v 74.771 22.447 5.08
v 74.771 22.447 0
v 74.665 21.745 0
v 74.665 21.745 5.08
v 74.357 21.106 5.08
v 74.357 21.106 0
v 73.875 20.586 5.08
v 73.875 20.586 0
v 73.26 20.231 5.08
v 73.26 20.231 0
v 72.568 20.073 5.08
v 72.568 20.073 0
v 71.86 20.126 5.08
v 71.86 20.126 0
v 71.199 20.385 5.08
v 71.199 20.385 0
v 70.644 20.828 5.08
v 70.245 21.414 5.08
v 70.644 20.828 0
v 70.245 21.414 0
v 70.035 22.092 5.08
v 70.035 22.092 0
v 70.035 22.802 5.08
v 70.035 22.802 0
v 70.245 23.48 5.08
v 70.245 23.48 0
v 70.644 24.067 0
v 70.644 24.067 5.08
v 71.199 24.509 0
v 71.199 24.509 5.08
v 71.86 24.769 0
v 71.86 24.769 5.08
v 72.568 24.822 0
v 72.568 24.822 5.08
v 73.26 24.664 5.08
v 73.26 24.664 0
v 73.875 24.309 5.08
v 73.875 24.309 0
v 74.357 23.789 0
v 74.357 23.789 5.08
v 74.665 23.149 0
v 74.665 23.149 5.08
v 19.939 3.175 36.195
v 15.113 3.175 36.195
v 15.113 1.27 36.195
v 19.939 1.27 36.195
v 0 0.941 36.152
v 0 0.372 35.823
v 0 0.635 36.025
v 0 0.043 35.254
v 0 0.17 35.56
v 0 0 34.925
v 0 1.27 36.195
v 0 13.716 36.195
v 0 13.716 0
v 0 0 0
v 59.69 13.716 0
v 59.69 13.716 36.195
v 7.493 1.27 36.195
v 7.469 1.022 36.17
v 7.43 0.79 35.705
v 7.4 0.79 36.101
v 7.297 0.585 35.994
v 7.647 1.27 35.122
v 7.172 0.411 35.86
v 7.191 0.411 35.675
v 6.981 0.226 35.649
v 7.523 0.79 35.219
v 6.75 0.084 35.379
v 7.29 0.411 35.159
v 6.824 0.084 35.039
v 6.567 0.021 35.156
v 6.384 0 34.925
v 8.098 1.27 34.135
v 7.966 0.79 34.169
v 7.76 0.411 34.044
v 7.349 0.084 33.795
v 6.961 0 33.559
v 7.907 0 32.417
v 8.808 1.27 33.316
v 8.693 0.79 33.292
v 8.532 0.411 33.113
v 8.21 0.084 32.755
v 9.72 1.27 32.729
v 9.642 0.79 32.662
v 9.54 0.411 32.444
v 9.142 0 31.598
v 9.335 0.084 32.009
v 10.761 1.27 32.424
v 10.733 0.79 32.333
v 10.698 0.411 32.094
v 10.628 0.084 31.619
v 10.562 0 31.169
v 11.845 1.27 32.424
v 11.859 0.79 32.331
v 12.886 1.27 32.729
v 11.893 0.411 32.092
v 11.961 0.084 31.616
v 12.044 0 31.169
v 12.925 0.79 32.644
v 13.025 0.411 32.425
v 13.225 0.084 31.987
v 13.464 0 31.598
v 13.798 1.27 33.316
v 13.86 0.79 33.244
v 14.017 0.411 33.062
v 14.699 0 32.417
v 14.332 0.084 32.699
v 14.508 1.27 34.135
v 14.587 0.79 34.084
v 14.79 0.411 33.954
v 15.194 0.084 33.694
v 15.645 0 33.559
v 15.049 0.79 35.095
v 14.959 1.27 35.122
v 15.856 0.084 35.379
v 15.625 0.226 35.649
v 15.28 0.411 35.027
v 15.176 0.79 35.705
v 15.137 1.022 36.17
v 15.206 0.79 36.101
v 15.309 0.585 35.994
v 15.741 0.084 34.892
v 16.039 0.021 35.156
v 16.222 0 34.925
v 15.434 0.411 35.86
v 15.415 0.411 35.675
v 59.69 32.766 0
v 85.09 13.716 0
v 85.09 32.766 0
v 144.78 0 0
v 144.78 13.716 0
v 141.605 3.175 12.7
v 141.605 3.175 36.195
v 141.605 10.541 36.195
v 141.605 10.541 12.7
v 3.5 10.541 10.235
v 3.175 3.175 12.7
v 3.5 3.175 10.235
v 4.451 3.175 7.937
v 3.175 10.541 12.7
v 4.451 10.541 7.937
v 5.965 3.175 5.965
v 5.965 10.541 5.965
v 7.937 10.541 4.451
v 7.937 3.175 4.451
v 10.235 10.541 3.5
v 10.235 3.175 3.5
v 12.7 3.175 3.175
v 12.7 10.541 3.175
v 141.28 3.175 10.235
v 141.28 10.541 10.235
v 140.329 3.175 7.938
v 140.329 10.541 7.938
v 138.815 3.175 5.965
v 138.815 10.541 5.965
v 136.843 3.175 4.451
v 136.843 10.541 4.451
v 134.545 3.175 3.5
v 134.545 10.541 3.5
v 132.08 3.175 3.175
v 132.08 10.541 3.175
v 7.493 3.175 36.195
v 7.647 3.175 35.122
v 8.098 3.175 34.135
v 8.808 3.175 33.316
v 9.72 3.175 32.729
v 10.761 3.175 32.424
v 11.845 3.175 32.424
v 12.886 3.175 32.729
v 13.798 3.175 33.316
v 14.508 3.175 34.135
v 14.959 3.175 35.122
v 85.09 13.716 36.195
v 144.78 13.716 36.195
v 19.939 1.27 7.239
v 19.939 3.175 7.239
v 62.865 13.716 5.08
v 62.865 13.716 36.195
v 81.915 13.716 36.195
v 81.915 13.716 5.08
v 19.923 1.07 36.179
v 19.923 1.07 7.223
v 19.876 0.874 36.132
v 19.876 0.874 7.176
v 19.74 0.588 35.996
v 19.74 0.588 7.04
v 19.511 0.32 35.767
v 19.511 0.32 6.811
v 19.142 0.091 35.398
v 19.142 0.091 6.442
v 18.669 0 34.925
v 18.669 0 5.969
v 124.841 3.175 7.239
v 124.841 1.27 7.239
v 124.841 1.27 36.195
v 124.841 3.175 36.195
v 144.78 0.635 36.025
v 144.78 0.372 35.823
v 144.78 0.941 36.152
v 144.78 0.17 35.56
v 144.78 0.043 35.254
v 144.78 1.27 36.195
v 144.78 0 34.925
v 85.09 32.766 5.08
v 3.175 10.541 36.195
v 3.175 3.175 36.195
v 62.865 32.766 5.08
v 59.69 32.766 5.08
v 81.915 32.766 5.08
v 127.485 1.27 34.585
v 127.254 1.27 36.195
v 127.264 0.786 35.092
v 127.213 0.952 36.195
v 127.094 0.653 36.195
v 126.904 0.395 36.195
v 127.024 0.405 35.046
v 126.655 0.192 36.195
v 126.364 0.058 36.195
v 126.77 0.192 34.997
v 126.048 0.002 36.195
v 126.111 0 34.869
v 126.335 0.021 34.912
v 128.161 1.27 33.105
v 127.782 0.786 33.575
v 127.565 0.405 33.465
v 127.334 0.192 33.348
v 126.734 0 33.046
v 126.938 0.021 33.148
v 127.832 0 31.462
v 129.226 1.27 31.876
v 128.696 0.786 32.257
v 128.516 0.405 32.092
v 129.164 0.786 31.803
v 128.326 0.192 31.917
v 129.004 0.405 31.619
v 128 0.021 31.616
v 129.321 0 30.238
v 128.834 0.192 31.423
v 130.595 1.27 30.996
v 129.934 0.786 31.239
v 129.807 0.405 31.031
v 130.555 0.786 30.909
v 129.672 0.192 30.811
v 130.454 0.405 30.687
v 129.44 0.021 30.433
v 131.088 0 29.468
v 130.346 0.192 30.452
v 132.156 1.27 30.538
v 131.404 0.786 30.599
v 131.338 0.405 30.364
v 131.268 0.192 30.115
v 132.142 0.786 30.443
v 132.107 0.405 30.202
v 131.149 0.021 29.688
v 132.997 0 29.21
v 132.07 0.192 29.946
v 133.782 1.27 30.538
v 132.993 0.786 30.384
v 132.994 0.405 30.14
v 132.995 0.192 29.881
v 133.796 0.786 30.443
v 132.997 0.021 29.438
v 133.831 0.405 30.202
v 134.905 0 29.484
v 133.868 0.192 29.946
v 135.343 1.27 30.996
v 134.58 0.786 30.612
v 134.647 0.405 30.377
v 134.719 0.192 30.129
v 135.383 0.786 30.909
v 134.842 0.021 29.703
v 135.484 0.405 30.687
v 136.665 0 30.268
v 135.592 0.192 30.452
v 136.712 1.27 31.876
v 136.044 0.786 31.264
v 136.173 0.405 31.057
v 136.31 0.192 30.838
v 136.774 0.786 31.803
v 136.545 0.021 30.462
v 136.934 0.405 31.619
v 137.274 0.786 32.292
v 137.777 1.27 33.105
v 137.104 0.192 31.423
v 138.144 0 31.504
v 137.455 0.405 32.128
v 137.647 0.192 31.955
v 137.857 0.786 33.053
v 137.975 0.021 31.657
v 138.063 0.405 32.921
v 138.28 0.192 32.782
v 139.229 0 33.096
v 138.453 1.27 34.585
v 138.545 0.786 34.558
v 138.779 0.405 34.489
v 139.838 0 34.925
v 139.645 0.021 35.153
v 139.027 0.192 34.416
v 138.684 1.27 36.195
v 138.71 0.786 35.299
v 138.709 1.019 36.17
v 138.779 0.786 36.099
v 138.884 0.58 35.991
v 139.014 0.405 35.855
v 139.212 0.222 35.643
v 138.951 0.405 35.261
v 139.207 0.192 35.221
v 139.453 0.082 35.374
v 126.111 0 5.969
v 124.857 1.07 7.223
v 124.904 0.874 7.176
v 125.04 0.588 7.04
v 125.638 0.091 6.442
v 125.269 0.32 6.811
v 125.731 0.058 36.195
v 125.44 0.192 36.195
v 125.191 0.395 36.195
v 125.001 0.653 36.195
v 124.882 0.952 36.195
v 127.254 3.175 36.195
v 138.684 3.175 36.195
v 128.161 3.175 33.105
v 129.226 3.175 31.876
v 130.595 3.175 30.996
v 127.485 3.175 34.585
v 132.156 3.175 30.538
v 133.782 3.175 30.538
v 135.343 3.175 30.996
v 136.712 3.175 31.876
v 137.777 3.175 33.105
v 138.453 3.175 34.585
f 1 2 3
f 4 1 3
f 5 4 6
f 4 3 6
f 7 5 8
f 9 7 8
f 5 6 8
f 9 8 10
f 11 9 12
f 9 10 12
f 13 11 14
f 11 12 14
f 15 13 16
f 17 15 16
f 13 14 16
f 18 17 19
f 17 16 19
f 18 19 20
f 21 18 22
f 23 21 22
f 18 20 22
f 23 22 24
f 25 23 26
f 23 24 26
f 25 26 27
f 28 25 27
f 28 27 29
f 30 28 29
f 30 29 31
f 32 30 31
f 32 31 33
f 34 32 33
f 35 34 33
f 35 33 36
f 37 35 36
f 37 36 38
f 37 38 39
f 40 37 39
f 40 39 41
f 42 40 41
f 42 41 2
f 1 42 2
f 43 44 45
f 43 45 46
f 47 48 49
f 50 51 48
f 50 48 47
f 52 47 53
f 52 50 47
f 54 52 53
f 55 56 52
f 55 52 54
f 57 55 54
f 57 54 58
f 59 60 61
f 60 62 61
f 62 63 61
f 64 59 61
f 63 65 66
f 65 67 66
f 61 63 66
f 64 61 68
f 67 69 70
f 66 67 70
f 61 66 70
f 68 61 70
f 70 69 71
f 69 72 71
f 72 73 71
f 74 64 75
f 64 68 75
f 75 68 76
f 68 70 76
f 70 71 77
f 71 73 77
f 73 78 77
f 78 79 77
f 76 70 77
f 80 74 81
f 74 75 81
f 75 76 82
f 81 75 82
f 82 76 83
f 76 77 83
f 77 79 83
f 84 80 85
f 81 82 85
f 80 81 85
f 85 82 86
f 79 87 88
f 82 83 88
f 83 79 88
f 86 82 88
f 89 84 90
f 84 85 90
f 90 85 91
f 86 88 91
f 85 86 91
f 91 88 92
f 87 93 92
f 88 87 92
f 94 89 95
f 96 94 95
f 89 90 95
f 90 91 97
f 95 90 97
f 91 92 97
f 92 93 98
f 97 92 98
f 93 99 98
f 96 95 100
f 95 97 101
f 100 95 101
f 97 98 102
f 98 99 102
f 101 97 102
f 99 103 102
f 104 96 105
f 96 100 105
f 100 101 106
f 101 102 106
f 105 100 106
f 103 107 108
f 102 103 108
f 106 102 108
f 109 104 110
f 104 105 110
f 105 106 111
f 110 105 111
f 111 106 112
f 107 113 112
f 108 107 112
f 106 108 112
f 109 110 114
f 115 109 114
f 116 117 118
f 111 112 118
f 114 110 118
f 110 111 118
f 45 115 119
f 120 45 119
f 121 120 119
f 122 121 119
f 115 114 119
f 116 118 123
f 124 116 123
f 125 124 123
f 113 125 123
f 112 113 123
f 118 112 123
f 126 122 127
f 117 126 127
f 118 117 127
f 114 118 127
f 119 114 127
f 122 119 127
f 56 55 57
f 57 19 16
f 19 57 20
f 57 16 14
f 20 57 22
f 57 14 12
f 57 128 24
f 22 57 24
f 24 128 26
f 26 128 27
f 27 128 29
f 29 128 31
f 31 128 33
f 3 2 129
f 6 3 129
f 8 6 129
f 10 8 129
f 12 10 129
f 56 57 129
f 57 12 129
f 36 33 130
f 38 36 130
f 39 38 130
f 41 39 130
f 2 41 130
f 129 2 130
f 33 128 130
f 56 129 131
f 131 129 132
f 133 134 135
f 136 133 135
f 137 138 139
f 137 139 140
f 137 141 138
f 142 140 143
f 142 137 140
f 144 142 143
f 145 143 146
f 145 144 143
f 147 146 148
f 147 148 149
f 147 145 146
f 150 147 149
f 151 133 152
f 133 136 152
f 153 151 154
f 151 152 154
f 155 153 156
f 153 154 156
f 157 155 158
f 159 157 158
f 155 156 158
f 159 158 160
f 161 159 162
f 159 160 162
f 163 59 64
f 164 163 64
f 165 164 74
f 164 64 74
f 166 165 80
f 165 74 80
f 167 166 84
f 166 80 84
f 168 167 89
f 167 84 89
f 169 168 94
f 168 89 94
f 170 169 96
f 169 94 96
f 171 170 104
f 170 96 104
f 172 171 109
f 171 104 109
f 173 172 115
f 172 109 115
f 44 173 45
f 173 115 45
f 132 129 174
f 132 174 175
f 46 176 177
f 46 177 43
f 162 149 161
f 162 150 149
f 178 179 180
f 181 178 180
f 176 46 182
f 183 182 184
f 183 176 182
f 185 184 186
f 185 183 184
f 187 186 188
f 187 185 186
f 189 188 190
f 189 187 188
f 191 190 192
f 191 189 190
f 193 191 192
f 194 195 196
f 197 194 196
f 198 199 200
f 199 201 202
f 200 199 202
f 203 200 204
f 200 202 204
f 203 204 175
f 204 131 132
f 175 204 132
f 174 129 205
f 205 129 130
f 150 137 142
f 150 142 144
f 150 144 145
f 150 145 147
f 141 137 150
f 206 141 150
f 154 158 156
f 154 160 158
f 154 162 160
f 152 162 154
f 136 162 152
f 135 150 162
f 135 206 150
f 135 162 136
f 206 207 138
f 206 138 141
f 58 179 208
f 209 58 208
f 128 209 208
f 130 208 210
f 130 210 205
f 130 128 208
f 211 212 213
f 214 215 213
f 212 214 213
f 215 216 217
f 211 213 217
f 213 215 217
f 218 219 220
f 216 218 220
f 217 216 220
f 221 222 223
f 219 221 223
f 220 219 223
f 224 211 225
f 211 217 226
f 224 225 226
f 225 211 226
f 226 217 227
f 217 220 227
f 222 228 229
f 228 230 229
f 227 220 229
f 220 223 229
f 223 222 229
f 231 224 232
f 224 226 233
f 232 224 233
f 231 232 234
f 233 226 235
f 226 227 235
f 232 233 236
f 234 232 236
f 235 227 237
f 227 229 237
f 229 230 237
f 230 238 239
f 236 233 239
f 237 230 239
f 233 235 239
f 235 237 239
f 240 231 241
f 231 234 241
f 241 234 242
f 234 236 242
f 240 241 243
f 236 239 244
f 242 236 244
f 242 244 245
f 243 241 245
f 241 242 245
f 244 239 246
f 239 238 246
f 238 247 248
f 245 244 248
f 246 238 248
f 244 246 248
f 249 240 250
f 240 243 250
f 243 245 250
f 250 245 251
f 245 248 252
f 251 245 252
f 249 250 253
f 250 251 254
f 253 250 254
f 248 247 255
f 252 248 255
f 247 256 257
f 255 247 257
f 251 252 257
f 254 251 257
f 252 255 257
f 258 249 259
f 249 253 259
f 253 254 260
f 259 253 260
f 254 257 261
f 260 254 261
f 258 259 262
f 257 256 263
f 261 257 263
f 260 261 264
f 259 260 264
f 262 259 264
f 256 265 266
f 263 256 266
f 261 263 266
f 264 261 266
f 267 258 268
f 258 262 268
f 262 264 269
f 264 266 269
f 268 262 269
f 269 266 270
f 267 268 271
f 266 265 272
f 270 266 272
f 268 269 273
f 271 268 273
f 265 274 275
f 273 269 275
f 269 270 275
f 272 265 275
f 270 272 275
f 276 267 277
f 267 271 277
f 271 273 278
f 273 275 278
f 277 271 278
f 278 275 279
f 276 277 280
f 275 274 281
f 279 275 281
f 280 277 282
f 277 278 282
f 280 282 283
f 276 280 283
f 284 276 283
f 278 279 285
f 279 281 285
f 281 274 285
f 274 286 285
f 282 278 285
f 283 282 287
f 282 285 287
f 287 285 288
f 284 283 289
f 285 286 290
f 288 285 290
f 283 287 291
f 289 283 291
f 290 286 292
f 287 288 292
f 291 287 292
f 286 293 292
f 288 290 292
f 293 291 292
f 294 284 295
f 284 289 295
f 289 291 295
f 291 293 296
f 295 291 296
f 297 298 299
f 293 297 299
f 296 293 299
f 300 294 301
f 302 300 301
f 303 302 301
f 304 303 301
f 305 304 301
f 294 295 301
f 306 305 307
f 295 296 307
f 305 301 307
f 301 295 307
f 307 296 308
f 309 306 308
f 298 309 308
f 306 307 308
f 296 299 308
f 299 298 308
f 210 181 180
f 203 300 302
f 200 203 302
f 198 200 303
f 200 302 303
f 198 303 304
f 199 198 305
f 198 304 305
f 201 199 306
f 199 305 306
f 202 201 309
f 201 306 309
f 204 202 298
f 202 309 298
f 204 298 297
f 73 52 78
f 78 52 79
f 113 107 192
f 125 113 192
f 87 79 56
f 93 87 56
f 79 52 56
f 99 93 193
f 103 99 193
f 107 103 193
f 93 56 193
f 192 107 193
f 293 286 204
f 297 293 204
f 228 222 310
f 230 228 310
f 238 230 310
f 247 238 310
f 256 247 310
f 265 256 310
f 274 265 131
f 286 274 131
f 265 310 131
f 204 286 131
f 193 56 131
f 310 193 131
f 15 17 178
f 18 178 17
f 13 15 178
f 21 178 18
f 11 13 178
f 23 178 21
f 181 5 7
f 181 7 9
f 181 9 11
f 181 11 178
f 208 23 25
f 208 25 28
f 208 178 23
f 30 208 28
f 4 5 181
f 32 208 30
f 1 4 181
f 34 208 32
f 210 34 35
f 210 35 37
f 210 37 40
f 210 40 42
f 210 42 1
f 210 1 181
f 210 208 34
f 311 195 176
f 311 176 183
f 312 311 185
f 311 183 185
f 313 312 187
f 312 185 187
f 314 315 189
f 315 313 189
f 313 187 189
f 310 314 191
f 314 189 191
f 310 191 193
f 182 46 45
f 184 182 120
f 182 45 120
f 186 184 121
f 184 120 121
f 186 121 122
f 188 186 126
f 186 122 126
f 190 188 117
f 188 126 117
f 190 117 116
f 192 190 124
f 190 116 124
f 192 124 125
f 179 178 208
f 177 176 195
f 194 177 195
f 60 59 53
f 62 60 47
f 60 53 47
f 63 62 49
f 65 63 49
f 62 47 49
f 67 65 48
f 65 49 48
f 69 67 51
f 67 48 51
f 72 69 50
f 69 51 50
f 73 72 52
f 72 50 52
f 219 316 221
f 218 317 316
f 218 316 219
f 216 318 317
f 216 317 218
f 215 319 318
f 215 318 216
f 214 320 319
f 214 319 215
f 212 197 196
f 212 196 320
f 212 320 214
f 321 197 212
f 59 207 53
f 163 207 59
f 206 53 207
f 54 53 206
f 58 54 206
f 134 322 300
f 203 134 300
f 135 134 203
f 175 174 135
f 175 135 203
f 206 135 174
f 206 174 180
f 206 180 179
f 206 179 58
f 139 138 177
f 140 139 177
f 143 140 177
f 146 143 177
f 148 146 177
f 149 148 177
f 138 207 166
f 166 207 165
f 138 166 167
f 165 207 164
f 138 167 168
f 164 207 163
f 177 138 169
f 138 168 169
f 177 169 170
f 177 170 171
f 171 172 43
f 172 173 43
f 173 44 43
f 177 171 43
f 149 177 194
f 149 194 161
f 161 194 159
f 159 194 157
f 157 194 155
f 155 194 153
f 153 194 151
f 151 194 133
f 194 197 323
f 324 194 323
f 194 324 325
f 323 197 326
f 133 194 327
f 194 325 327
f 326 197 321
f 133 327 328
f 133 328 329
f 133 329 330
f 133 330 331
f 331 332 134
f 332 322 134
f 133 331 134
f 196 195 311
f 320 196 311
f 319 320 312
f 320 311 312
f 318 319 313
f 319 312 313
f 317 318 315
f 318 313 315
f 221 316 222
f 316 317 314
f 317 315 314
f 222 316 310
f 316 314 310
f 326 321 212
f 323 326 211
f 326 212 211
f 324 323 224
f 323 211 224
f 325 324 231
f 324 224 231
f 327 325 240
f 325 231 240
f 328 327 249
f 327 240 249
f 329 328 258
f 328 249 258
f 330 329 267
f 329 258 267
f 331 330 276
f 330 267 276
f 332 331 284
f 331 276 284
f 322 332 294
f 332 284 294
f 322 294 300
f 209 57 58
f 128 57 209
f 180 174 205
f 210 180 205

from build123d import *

# Parameters (mm, degrees)
F0_W          = 144.78
F0_H          = 13.716
F1_DEPTH      = 36.195
F2_W          = 138.43
F2_H          = 7.366
F3_DEPTH      = 33.02
F4_W          = 104.902
F4_H          = 28.956
F5_DEPTH      = 3.175
F6_W          = 25.4
F6_H          = 19.05
F7_DEPTH      = 36.195
F8_W          = 19.05
F8_H          = 19.05
F9_DEPTH      = 31.115
F11_DEPTH     = 25.4
F12_R         = 2.38125
F13_DEPTH     = 25.4
F14_R         = 9.525
F15_T1_DEPTH  = 104.902
F15_T3_DEPTH  = 13.843
F15_T5_DEPTH  = 11.176
F15_T7_DEPTH  = 12.446
F15_T9_DEPTH  = 32.131
F15_T12_ANGLE = 243.7643577336
F15_T14_ANGLE = 275.6465366004
F15_T19_DEPTH = 108.077
F15_T23_DEPTH = 32.131
F15_T30_DEPTH = 32.131
F15_T34_DEPTH = 108.077


# Not quite as in the source:
# - a fillet or chamfer that OpenCascade refuses, or shapes differently, is made with other operations: its cross-section is extruded or revolved along the edge and cut away or added


with BuildPart() as f1:
    # F0 (on Top) → F1 (new body)
    with BuildSketch(Plane.XY):
        with Locations((72.39, 6.858)):
            Rectangle(F0_W, F0_H)
    extrude(amount=F1_DEPTH)

    # F2 (on face) → F3 (cut)
    with BuildSketch(Plane.XY.offset(36.195)):
        with Locations((72.39, 6.858)):
            Rectangle(F2_W, F2_H)
    extrude(amount=-F3_DEPTH, mode=Mode.SUBTRACT)

    # F4 (on face) → F5 (cut)
    with BuildSketch(Plane.XZ):
        with BuildLine():
            ThreePointArc((7.493, 36.195), (11.303, 32.385), (15.113, 36.195))
            Line((15.113, 36.195), (7.493, 36.195))
        make_face()
        with Locations((72.39, 21.717)):
            Rectangle(F4_W, F4_H)
        with BuildLine():
            Line((138.684, 36.195), (127.254, 36.195))
            ThreePointArc((127.254, 36.195), (132.969, 30.48), (138.684, 36.195))
        make_face()
    extrude(amount=-F5_DEPTH, mode=Mode.SUBTRACT)

    # F6 (on Top) → F7 (join)
    with BuildSketch(Plane.XY):
        with Locations((72.39, 23.241)):
            Rectangle(F6_W, F6_H)
    extrude(amount=F7_DEPTH)

    # F8 (on face) → F9 (cut)
    with BuildSketch(Plane.XY.offset(36.195)):
        with Locations((72.39, 23.241)):
            Rectangle(F8_W, F8_H)
    extrude(amount=-F9_DEPTH, mode=Mode.SUBTRACT)

    # F10 (on face) → F11 (cut)
    with BuildSketch(Plane.YZ.offset(85.09)):
        Polygon((32.766, 36.195), (13.716, 36.195), (32.766, 5.08), align=None)
    extrude(amount=-F11_DEPTH, mode=Mode.SUBTRACT)

    # F12 (on face) → F13 (cut)
    with BuildSketch(Plane(origin=(0, 0, 0), x_dir=(1, 0, 0), z_dir=(0, 0, -1))):
        with Locations((72.39, -22.44725)):
            Circle(F12_R)
    extrude(amount=-F13_DEPTH, mode=Mode.SUBTRACT)

    # F14
    f14_edges = [f1.edges().sort_by_distance(p)[0] for p in [
        (141.605, 6.858, 3.175),
        (3.175, 6.858, 3.175),
    ]]
    fillet(f14_edges, radius=F14_R)

    # F15: fillet of radius 1.27 on 9 edges, made by hand

    # F15_s2 → F15_t1 (cut)
    with BuildSketch(Plane.YZ.offset(19.939)):
        with BuildLine():
            ThreePointArc((1.27, 7.239), (0.3719743879, 6.8670256121), (0, 5.969))
            Line((0, 5.969), (0, 7.239))
            Line((0, 7.239), (1.27, 7.239))
        make_face()
    extrude(amount=F15_T1_DEPTH, mode=Mode.SUBTRACT)

    # F15_s4 → F15_t3 (cut)
    with BuildSketch(Plane.YZ.offset(-3.175)):
        with BuildLine():
            ThreePointArc((1.27, 36.195), (0.3719743879, 35.8230256121), (0, 34.925))
            Line((0, 34.925), (0, 36.195))
            Line((0, 36.195), (1.27, 36.195))
        make_face()
    extrude(amount=F15_T3_DEPTH, mode=Mode.SUBTRACT)

    # F15_s6 → F15_t5 (cut)
    with BuildSketch(Plane.YZ.offset(11.938)):
        with BuildLine():
            ThreePointArc((1.27, 36.195), (0.3719743879, 35.8230256121), (0, 34.925))
            Line((0, 34.925), (0, 36.195))
            Line((0, 36.195), (1.27, 36.195))
        make_face()
    extrude(amount=F15_T5_DEPTH, mode=Mode.SUBTRACT)

    # F15_s8 → F15_t7 (cut)
    with BuildSketch(Plane.YZ.offset(135.509)):
        with BuildLine():
            ThreePointArc((1.27, 36.195), (0.3719743879, 35.8230256121), (0, 34.925))
            Line((0, 34.925), (0, 36.195))
            Line((0, 36.195), (1.27, 36.195))
        make_face()
    extrude(amount=F15_T7_DEPTH, mode=Mode.SUBTRACT)

    # F15_s10 → F15_t9 (cut)
    with BuildSketch(Plane.XY.offset(7.239)):
        with BuildLine():
            ThreePointArc((19.939, 1.27), (19.5670256121, 0.3719743879), (18.669, 0))
            Line((18.669, 0), (19.939, 0))
            Line((19.939, 0), (19.939, 1.27))
        make_face()
        with BuildLine():
            ThreePointArc((124.841, 1.27), (125.2129743879, 0.3719743879), (126.111, 0))
            Line((126.111, 0), (124.841, 0))
            Line((124.841, 0), (124.841, 1.27))
        make_face()
    extrude(amount=F15_T9_DEPTH, mode=Mode.SUBTRACT)

    # F15_s11 → F15_t12 (revolve, cut)
    with BuildSketch(Plane(origin=(53.3272604269, 0, 85.7332545483), x_dir=(0, 1, 0), z_dir=(0.5281742472, 0, 0.8491360107))):
        with BuildLine():
            ThreePointArc((1.27, -88.0764993266), (0.3719743879, -87.7045249387), (0, -86.8064993266))
            Line((0, -86.8064993266), (0, -88.0764993266))
            Line((0, -88.0764993266), (1.27, -88.0764993266))
        make_face()
    revolve(axis=Axis((132.969, 0, 36.195), (0, -1, 0)), revolution_arc=F15_T12_ANGLE, mode=Mode.SUBTRACT)

    # F15_s13 → F15_t14 (revolve, cut)
    with BuildSketch(Plane(origin=(24.217245462, 0, 21.9409429798), x_dir=(0, 1, 0), z_dir=(0.7410773266, 0, 0.6714196869))):
        with BuildLine():
            ThreePointArc((1.27, 23.0442371148), (0.3719743879, 23.4162115027), (0, 24.3142371148))
            Line((0, 24.3142371148), (0, 23.0442371148))
            Line((0, 23.0442371148), (1.27, 23.0442371148))
        make_face()
    revolve(axis=Axis((11.303, 0, 36.195), (0, -1, 0)), revolution_arc=F15_T14_ANGLE, mode=Mode.SUBTRACT)


with BuildPart() as f15_tool17:
    # F15_s18 → F15_t19 (new body)
    with BuildSketch(Plane.YZ.offset(16.764)):
        with BuildLine():
            ThreePointArc((1.27, 7.239), (0.3719743879, 6.8670256121), (0, 5.969))
            Line((0, 5.969), (0, 7.239))
            Line((0, 7.239), (1.27, 7.239))
        make_face()
    extrude(amount=F15_T19_DEPTH)

    split(bisect_by=Plane.YZ.offset(19.939), keep=Keep.BOTTOM)


with BuildPart() as f15_tool21:
    # F15_s22 → F15_t23 (new body)
    with BuildSketch(Plane.XY.offset(36.195)):
        with BuildLine():
            ThreePointArc((19.939, 1.27), (19.5670256121, 0.3719743879), (18.669, 0))
            Line((18.669, 0), (19.939, 0))
            Line((19.939, 0), (19.939, 1.27))
        make_face()
    extrude(amount=-F15_T23_DEPTH)

    split(bisect_by=Plane.XY.offset(7.239), keep=Keep.BOTTOM)


with BuildPart() as f15_tool17_1:
    add(f15_tool17.part)

    # F15_t25: intersect F15_tool21
    add(f15_tool21.part, mode=Mode.INTERSECT)


with BuildPart() as f1_1:
    add(f1.part)

    # F15_t15: cut F15_tool17
    add(f15_tool17_1.part, mode=Mode.SUBTRACT)


with BuildPart() as f15_tool28:
    # F15_s29 → F15_t30 (new body)
    with BuildSketch(Plane.XY.offset(4.064)):
        with BuildLine():
            ThreePointArc((124.841, 1.27), (125.2129743879, 0.3719743879), (126.111, 0))
            Line((126.111, 0), (124.841, 0))
            Line((124.841, 0), (124.841, 1.27))
        make_face()
    extrude(amount=F15_T30_DEPTH)

    split(bisect_by=Plane.XY.offset(7.239), keep=Keep.BOTTOM)


with BuildPart() as f15_tool32:
    # F15_s33 → F15_t34 (new body)
    with BuildSketch(Plane.YZ.offset(19.939)):
        with BuildLine():
            ThreePointArc((1.27, 7.239), (0.3719743879, 6.8670256121), (0, 5.969))
            Line((0, 5.969), (0, 7.239))
            Line((0, 7.239), (1.27, 7.239))
        make_face()
    extrude(amount=F15_T34_DEPTH)

    split(bisect_by=Plane.YZ.offset(124.841), keep=Keep.TOP)


with BuildPart() as f15_tool28_1:
    add(f15_tool28.part)

    # F15_t36: intersect F15_tool32
    add(f15_tool32.part, mode=Mode.INTERSECT)


with BuildPart() as f1_2:
    add(f1_1.part)

    # F15_t26: cut F15_tool28
    add(f15_tool28_1.part, mode=Mode.SUBTRACT)


solid = f1_2.part
